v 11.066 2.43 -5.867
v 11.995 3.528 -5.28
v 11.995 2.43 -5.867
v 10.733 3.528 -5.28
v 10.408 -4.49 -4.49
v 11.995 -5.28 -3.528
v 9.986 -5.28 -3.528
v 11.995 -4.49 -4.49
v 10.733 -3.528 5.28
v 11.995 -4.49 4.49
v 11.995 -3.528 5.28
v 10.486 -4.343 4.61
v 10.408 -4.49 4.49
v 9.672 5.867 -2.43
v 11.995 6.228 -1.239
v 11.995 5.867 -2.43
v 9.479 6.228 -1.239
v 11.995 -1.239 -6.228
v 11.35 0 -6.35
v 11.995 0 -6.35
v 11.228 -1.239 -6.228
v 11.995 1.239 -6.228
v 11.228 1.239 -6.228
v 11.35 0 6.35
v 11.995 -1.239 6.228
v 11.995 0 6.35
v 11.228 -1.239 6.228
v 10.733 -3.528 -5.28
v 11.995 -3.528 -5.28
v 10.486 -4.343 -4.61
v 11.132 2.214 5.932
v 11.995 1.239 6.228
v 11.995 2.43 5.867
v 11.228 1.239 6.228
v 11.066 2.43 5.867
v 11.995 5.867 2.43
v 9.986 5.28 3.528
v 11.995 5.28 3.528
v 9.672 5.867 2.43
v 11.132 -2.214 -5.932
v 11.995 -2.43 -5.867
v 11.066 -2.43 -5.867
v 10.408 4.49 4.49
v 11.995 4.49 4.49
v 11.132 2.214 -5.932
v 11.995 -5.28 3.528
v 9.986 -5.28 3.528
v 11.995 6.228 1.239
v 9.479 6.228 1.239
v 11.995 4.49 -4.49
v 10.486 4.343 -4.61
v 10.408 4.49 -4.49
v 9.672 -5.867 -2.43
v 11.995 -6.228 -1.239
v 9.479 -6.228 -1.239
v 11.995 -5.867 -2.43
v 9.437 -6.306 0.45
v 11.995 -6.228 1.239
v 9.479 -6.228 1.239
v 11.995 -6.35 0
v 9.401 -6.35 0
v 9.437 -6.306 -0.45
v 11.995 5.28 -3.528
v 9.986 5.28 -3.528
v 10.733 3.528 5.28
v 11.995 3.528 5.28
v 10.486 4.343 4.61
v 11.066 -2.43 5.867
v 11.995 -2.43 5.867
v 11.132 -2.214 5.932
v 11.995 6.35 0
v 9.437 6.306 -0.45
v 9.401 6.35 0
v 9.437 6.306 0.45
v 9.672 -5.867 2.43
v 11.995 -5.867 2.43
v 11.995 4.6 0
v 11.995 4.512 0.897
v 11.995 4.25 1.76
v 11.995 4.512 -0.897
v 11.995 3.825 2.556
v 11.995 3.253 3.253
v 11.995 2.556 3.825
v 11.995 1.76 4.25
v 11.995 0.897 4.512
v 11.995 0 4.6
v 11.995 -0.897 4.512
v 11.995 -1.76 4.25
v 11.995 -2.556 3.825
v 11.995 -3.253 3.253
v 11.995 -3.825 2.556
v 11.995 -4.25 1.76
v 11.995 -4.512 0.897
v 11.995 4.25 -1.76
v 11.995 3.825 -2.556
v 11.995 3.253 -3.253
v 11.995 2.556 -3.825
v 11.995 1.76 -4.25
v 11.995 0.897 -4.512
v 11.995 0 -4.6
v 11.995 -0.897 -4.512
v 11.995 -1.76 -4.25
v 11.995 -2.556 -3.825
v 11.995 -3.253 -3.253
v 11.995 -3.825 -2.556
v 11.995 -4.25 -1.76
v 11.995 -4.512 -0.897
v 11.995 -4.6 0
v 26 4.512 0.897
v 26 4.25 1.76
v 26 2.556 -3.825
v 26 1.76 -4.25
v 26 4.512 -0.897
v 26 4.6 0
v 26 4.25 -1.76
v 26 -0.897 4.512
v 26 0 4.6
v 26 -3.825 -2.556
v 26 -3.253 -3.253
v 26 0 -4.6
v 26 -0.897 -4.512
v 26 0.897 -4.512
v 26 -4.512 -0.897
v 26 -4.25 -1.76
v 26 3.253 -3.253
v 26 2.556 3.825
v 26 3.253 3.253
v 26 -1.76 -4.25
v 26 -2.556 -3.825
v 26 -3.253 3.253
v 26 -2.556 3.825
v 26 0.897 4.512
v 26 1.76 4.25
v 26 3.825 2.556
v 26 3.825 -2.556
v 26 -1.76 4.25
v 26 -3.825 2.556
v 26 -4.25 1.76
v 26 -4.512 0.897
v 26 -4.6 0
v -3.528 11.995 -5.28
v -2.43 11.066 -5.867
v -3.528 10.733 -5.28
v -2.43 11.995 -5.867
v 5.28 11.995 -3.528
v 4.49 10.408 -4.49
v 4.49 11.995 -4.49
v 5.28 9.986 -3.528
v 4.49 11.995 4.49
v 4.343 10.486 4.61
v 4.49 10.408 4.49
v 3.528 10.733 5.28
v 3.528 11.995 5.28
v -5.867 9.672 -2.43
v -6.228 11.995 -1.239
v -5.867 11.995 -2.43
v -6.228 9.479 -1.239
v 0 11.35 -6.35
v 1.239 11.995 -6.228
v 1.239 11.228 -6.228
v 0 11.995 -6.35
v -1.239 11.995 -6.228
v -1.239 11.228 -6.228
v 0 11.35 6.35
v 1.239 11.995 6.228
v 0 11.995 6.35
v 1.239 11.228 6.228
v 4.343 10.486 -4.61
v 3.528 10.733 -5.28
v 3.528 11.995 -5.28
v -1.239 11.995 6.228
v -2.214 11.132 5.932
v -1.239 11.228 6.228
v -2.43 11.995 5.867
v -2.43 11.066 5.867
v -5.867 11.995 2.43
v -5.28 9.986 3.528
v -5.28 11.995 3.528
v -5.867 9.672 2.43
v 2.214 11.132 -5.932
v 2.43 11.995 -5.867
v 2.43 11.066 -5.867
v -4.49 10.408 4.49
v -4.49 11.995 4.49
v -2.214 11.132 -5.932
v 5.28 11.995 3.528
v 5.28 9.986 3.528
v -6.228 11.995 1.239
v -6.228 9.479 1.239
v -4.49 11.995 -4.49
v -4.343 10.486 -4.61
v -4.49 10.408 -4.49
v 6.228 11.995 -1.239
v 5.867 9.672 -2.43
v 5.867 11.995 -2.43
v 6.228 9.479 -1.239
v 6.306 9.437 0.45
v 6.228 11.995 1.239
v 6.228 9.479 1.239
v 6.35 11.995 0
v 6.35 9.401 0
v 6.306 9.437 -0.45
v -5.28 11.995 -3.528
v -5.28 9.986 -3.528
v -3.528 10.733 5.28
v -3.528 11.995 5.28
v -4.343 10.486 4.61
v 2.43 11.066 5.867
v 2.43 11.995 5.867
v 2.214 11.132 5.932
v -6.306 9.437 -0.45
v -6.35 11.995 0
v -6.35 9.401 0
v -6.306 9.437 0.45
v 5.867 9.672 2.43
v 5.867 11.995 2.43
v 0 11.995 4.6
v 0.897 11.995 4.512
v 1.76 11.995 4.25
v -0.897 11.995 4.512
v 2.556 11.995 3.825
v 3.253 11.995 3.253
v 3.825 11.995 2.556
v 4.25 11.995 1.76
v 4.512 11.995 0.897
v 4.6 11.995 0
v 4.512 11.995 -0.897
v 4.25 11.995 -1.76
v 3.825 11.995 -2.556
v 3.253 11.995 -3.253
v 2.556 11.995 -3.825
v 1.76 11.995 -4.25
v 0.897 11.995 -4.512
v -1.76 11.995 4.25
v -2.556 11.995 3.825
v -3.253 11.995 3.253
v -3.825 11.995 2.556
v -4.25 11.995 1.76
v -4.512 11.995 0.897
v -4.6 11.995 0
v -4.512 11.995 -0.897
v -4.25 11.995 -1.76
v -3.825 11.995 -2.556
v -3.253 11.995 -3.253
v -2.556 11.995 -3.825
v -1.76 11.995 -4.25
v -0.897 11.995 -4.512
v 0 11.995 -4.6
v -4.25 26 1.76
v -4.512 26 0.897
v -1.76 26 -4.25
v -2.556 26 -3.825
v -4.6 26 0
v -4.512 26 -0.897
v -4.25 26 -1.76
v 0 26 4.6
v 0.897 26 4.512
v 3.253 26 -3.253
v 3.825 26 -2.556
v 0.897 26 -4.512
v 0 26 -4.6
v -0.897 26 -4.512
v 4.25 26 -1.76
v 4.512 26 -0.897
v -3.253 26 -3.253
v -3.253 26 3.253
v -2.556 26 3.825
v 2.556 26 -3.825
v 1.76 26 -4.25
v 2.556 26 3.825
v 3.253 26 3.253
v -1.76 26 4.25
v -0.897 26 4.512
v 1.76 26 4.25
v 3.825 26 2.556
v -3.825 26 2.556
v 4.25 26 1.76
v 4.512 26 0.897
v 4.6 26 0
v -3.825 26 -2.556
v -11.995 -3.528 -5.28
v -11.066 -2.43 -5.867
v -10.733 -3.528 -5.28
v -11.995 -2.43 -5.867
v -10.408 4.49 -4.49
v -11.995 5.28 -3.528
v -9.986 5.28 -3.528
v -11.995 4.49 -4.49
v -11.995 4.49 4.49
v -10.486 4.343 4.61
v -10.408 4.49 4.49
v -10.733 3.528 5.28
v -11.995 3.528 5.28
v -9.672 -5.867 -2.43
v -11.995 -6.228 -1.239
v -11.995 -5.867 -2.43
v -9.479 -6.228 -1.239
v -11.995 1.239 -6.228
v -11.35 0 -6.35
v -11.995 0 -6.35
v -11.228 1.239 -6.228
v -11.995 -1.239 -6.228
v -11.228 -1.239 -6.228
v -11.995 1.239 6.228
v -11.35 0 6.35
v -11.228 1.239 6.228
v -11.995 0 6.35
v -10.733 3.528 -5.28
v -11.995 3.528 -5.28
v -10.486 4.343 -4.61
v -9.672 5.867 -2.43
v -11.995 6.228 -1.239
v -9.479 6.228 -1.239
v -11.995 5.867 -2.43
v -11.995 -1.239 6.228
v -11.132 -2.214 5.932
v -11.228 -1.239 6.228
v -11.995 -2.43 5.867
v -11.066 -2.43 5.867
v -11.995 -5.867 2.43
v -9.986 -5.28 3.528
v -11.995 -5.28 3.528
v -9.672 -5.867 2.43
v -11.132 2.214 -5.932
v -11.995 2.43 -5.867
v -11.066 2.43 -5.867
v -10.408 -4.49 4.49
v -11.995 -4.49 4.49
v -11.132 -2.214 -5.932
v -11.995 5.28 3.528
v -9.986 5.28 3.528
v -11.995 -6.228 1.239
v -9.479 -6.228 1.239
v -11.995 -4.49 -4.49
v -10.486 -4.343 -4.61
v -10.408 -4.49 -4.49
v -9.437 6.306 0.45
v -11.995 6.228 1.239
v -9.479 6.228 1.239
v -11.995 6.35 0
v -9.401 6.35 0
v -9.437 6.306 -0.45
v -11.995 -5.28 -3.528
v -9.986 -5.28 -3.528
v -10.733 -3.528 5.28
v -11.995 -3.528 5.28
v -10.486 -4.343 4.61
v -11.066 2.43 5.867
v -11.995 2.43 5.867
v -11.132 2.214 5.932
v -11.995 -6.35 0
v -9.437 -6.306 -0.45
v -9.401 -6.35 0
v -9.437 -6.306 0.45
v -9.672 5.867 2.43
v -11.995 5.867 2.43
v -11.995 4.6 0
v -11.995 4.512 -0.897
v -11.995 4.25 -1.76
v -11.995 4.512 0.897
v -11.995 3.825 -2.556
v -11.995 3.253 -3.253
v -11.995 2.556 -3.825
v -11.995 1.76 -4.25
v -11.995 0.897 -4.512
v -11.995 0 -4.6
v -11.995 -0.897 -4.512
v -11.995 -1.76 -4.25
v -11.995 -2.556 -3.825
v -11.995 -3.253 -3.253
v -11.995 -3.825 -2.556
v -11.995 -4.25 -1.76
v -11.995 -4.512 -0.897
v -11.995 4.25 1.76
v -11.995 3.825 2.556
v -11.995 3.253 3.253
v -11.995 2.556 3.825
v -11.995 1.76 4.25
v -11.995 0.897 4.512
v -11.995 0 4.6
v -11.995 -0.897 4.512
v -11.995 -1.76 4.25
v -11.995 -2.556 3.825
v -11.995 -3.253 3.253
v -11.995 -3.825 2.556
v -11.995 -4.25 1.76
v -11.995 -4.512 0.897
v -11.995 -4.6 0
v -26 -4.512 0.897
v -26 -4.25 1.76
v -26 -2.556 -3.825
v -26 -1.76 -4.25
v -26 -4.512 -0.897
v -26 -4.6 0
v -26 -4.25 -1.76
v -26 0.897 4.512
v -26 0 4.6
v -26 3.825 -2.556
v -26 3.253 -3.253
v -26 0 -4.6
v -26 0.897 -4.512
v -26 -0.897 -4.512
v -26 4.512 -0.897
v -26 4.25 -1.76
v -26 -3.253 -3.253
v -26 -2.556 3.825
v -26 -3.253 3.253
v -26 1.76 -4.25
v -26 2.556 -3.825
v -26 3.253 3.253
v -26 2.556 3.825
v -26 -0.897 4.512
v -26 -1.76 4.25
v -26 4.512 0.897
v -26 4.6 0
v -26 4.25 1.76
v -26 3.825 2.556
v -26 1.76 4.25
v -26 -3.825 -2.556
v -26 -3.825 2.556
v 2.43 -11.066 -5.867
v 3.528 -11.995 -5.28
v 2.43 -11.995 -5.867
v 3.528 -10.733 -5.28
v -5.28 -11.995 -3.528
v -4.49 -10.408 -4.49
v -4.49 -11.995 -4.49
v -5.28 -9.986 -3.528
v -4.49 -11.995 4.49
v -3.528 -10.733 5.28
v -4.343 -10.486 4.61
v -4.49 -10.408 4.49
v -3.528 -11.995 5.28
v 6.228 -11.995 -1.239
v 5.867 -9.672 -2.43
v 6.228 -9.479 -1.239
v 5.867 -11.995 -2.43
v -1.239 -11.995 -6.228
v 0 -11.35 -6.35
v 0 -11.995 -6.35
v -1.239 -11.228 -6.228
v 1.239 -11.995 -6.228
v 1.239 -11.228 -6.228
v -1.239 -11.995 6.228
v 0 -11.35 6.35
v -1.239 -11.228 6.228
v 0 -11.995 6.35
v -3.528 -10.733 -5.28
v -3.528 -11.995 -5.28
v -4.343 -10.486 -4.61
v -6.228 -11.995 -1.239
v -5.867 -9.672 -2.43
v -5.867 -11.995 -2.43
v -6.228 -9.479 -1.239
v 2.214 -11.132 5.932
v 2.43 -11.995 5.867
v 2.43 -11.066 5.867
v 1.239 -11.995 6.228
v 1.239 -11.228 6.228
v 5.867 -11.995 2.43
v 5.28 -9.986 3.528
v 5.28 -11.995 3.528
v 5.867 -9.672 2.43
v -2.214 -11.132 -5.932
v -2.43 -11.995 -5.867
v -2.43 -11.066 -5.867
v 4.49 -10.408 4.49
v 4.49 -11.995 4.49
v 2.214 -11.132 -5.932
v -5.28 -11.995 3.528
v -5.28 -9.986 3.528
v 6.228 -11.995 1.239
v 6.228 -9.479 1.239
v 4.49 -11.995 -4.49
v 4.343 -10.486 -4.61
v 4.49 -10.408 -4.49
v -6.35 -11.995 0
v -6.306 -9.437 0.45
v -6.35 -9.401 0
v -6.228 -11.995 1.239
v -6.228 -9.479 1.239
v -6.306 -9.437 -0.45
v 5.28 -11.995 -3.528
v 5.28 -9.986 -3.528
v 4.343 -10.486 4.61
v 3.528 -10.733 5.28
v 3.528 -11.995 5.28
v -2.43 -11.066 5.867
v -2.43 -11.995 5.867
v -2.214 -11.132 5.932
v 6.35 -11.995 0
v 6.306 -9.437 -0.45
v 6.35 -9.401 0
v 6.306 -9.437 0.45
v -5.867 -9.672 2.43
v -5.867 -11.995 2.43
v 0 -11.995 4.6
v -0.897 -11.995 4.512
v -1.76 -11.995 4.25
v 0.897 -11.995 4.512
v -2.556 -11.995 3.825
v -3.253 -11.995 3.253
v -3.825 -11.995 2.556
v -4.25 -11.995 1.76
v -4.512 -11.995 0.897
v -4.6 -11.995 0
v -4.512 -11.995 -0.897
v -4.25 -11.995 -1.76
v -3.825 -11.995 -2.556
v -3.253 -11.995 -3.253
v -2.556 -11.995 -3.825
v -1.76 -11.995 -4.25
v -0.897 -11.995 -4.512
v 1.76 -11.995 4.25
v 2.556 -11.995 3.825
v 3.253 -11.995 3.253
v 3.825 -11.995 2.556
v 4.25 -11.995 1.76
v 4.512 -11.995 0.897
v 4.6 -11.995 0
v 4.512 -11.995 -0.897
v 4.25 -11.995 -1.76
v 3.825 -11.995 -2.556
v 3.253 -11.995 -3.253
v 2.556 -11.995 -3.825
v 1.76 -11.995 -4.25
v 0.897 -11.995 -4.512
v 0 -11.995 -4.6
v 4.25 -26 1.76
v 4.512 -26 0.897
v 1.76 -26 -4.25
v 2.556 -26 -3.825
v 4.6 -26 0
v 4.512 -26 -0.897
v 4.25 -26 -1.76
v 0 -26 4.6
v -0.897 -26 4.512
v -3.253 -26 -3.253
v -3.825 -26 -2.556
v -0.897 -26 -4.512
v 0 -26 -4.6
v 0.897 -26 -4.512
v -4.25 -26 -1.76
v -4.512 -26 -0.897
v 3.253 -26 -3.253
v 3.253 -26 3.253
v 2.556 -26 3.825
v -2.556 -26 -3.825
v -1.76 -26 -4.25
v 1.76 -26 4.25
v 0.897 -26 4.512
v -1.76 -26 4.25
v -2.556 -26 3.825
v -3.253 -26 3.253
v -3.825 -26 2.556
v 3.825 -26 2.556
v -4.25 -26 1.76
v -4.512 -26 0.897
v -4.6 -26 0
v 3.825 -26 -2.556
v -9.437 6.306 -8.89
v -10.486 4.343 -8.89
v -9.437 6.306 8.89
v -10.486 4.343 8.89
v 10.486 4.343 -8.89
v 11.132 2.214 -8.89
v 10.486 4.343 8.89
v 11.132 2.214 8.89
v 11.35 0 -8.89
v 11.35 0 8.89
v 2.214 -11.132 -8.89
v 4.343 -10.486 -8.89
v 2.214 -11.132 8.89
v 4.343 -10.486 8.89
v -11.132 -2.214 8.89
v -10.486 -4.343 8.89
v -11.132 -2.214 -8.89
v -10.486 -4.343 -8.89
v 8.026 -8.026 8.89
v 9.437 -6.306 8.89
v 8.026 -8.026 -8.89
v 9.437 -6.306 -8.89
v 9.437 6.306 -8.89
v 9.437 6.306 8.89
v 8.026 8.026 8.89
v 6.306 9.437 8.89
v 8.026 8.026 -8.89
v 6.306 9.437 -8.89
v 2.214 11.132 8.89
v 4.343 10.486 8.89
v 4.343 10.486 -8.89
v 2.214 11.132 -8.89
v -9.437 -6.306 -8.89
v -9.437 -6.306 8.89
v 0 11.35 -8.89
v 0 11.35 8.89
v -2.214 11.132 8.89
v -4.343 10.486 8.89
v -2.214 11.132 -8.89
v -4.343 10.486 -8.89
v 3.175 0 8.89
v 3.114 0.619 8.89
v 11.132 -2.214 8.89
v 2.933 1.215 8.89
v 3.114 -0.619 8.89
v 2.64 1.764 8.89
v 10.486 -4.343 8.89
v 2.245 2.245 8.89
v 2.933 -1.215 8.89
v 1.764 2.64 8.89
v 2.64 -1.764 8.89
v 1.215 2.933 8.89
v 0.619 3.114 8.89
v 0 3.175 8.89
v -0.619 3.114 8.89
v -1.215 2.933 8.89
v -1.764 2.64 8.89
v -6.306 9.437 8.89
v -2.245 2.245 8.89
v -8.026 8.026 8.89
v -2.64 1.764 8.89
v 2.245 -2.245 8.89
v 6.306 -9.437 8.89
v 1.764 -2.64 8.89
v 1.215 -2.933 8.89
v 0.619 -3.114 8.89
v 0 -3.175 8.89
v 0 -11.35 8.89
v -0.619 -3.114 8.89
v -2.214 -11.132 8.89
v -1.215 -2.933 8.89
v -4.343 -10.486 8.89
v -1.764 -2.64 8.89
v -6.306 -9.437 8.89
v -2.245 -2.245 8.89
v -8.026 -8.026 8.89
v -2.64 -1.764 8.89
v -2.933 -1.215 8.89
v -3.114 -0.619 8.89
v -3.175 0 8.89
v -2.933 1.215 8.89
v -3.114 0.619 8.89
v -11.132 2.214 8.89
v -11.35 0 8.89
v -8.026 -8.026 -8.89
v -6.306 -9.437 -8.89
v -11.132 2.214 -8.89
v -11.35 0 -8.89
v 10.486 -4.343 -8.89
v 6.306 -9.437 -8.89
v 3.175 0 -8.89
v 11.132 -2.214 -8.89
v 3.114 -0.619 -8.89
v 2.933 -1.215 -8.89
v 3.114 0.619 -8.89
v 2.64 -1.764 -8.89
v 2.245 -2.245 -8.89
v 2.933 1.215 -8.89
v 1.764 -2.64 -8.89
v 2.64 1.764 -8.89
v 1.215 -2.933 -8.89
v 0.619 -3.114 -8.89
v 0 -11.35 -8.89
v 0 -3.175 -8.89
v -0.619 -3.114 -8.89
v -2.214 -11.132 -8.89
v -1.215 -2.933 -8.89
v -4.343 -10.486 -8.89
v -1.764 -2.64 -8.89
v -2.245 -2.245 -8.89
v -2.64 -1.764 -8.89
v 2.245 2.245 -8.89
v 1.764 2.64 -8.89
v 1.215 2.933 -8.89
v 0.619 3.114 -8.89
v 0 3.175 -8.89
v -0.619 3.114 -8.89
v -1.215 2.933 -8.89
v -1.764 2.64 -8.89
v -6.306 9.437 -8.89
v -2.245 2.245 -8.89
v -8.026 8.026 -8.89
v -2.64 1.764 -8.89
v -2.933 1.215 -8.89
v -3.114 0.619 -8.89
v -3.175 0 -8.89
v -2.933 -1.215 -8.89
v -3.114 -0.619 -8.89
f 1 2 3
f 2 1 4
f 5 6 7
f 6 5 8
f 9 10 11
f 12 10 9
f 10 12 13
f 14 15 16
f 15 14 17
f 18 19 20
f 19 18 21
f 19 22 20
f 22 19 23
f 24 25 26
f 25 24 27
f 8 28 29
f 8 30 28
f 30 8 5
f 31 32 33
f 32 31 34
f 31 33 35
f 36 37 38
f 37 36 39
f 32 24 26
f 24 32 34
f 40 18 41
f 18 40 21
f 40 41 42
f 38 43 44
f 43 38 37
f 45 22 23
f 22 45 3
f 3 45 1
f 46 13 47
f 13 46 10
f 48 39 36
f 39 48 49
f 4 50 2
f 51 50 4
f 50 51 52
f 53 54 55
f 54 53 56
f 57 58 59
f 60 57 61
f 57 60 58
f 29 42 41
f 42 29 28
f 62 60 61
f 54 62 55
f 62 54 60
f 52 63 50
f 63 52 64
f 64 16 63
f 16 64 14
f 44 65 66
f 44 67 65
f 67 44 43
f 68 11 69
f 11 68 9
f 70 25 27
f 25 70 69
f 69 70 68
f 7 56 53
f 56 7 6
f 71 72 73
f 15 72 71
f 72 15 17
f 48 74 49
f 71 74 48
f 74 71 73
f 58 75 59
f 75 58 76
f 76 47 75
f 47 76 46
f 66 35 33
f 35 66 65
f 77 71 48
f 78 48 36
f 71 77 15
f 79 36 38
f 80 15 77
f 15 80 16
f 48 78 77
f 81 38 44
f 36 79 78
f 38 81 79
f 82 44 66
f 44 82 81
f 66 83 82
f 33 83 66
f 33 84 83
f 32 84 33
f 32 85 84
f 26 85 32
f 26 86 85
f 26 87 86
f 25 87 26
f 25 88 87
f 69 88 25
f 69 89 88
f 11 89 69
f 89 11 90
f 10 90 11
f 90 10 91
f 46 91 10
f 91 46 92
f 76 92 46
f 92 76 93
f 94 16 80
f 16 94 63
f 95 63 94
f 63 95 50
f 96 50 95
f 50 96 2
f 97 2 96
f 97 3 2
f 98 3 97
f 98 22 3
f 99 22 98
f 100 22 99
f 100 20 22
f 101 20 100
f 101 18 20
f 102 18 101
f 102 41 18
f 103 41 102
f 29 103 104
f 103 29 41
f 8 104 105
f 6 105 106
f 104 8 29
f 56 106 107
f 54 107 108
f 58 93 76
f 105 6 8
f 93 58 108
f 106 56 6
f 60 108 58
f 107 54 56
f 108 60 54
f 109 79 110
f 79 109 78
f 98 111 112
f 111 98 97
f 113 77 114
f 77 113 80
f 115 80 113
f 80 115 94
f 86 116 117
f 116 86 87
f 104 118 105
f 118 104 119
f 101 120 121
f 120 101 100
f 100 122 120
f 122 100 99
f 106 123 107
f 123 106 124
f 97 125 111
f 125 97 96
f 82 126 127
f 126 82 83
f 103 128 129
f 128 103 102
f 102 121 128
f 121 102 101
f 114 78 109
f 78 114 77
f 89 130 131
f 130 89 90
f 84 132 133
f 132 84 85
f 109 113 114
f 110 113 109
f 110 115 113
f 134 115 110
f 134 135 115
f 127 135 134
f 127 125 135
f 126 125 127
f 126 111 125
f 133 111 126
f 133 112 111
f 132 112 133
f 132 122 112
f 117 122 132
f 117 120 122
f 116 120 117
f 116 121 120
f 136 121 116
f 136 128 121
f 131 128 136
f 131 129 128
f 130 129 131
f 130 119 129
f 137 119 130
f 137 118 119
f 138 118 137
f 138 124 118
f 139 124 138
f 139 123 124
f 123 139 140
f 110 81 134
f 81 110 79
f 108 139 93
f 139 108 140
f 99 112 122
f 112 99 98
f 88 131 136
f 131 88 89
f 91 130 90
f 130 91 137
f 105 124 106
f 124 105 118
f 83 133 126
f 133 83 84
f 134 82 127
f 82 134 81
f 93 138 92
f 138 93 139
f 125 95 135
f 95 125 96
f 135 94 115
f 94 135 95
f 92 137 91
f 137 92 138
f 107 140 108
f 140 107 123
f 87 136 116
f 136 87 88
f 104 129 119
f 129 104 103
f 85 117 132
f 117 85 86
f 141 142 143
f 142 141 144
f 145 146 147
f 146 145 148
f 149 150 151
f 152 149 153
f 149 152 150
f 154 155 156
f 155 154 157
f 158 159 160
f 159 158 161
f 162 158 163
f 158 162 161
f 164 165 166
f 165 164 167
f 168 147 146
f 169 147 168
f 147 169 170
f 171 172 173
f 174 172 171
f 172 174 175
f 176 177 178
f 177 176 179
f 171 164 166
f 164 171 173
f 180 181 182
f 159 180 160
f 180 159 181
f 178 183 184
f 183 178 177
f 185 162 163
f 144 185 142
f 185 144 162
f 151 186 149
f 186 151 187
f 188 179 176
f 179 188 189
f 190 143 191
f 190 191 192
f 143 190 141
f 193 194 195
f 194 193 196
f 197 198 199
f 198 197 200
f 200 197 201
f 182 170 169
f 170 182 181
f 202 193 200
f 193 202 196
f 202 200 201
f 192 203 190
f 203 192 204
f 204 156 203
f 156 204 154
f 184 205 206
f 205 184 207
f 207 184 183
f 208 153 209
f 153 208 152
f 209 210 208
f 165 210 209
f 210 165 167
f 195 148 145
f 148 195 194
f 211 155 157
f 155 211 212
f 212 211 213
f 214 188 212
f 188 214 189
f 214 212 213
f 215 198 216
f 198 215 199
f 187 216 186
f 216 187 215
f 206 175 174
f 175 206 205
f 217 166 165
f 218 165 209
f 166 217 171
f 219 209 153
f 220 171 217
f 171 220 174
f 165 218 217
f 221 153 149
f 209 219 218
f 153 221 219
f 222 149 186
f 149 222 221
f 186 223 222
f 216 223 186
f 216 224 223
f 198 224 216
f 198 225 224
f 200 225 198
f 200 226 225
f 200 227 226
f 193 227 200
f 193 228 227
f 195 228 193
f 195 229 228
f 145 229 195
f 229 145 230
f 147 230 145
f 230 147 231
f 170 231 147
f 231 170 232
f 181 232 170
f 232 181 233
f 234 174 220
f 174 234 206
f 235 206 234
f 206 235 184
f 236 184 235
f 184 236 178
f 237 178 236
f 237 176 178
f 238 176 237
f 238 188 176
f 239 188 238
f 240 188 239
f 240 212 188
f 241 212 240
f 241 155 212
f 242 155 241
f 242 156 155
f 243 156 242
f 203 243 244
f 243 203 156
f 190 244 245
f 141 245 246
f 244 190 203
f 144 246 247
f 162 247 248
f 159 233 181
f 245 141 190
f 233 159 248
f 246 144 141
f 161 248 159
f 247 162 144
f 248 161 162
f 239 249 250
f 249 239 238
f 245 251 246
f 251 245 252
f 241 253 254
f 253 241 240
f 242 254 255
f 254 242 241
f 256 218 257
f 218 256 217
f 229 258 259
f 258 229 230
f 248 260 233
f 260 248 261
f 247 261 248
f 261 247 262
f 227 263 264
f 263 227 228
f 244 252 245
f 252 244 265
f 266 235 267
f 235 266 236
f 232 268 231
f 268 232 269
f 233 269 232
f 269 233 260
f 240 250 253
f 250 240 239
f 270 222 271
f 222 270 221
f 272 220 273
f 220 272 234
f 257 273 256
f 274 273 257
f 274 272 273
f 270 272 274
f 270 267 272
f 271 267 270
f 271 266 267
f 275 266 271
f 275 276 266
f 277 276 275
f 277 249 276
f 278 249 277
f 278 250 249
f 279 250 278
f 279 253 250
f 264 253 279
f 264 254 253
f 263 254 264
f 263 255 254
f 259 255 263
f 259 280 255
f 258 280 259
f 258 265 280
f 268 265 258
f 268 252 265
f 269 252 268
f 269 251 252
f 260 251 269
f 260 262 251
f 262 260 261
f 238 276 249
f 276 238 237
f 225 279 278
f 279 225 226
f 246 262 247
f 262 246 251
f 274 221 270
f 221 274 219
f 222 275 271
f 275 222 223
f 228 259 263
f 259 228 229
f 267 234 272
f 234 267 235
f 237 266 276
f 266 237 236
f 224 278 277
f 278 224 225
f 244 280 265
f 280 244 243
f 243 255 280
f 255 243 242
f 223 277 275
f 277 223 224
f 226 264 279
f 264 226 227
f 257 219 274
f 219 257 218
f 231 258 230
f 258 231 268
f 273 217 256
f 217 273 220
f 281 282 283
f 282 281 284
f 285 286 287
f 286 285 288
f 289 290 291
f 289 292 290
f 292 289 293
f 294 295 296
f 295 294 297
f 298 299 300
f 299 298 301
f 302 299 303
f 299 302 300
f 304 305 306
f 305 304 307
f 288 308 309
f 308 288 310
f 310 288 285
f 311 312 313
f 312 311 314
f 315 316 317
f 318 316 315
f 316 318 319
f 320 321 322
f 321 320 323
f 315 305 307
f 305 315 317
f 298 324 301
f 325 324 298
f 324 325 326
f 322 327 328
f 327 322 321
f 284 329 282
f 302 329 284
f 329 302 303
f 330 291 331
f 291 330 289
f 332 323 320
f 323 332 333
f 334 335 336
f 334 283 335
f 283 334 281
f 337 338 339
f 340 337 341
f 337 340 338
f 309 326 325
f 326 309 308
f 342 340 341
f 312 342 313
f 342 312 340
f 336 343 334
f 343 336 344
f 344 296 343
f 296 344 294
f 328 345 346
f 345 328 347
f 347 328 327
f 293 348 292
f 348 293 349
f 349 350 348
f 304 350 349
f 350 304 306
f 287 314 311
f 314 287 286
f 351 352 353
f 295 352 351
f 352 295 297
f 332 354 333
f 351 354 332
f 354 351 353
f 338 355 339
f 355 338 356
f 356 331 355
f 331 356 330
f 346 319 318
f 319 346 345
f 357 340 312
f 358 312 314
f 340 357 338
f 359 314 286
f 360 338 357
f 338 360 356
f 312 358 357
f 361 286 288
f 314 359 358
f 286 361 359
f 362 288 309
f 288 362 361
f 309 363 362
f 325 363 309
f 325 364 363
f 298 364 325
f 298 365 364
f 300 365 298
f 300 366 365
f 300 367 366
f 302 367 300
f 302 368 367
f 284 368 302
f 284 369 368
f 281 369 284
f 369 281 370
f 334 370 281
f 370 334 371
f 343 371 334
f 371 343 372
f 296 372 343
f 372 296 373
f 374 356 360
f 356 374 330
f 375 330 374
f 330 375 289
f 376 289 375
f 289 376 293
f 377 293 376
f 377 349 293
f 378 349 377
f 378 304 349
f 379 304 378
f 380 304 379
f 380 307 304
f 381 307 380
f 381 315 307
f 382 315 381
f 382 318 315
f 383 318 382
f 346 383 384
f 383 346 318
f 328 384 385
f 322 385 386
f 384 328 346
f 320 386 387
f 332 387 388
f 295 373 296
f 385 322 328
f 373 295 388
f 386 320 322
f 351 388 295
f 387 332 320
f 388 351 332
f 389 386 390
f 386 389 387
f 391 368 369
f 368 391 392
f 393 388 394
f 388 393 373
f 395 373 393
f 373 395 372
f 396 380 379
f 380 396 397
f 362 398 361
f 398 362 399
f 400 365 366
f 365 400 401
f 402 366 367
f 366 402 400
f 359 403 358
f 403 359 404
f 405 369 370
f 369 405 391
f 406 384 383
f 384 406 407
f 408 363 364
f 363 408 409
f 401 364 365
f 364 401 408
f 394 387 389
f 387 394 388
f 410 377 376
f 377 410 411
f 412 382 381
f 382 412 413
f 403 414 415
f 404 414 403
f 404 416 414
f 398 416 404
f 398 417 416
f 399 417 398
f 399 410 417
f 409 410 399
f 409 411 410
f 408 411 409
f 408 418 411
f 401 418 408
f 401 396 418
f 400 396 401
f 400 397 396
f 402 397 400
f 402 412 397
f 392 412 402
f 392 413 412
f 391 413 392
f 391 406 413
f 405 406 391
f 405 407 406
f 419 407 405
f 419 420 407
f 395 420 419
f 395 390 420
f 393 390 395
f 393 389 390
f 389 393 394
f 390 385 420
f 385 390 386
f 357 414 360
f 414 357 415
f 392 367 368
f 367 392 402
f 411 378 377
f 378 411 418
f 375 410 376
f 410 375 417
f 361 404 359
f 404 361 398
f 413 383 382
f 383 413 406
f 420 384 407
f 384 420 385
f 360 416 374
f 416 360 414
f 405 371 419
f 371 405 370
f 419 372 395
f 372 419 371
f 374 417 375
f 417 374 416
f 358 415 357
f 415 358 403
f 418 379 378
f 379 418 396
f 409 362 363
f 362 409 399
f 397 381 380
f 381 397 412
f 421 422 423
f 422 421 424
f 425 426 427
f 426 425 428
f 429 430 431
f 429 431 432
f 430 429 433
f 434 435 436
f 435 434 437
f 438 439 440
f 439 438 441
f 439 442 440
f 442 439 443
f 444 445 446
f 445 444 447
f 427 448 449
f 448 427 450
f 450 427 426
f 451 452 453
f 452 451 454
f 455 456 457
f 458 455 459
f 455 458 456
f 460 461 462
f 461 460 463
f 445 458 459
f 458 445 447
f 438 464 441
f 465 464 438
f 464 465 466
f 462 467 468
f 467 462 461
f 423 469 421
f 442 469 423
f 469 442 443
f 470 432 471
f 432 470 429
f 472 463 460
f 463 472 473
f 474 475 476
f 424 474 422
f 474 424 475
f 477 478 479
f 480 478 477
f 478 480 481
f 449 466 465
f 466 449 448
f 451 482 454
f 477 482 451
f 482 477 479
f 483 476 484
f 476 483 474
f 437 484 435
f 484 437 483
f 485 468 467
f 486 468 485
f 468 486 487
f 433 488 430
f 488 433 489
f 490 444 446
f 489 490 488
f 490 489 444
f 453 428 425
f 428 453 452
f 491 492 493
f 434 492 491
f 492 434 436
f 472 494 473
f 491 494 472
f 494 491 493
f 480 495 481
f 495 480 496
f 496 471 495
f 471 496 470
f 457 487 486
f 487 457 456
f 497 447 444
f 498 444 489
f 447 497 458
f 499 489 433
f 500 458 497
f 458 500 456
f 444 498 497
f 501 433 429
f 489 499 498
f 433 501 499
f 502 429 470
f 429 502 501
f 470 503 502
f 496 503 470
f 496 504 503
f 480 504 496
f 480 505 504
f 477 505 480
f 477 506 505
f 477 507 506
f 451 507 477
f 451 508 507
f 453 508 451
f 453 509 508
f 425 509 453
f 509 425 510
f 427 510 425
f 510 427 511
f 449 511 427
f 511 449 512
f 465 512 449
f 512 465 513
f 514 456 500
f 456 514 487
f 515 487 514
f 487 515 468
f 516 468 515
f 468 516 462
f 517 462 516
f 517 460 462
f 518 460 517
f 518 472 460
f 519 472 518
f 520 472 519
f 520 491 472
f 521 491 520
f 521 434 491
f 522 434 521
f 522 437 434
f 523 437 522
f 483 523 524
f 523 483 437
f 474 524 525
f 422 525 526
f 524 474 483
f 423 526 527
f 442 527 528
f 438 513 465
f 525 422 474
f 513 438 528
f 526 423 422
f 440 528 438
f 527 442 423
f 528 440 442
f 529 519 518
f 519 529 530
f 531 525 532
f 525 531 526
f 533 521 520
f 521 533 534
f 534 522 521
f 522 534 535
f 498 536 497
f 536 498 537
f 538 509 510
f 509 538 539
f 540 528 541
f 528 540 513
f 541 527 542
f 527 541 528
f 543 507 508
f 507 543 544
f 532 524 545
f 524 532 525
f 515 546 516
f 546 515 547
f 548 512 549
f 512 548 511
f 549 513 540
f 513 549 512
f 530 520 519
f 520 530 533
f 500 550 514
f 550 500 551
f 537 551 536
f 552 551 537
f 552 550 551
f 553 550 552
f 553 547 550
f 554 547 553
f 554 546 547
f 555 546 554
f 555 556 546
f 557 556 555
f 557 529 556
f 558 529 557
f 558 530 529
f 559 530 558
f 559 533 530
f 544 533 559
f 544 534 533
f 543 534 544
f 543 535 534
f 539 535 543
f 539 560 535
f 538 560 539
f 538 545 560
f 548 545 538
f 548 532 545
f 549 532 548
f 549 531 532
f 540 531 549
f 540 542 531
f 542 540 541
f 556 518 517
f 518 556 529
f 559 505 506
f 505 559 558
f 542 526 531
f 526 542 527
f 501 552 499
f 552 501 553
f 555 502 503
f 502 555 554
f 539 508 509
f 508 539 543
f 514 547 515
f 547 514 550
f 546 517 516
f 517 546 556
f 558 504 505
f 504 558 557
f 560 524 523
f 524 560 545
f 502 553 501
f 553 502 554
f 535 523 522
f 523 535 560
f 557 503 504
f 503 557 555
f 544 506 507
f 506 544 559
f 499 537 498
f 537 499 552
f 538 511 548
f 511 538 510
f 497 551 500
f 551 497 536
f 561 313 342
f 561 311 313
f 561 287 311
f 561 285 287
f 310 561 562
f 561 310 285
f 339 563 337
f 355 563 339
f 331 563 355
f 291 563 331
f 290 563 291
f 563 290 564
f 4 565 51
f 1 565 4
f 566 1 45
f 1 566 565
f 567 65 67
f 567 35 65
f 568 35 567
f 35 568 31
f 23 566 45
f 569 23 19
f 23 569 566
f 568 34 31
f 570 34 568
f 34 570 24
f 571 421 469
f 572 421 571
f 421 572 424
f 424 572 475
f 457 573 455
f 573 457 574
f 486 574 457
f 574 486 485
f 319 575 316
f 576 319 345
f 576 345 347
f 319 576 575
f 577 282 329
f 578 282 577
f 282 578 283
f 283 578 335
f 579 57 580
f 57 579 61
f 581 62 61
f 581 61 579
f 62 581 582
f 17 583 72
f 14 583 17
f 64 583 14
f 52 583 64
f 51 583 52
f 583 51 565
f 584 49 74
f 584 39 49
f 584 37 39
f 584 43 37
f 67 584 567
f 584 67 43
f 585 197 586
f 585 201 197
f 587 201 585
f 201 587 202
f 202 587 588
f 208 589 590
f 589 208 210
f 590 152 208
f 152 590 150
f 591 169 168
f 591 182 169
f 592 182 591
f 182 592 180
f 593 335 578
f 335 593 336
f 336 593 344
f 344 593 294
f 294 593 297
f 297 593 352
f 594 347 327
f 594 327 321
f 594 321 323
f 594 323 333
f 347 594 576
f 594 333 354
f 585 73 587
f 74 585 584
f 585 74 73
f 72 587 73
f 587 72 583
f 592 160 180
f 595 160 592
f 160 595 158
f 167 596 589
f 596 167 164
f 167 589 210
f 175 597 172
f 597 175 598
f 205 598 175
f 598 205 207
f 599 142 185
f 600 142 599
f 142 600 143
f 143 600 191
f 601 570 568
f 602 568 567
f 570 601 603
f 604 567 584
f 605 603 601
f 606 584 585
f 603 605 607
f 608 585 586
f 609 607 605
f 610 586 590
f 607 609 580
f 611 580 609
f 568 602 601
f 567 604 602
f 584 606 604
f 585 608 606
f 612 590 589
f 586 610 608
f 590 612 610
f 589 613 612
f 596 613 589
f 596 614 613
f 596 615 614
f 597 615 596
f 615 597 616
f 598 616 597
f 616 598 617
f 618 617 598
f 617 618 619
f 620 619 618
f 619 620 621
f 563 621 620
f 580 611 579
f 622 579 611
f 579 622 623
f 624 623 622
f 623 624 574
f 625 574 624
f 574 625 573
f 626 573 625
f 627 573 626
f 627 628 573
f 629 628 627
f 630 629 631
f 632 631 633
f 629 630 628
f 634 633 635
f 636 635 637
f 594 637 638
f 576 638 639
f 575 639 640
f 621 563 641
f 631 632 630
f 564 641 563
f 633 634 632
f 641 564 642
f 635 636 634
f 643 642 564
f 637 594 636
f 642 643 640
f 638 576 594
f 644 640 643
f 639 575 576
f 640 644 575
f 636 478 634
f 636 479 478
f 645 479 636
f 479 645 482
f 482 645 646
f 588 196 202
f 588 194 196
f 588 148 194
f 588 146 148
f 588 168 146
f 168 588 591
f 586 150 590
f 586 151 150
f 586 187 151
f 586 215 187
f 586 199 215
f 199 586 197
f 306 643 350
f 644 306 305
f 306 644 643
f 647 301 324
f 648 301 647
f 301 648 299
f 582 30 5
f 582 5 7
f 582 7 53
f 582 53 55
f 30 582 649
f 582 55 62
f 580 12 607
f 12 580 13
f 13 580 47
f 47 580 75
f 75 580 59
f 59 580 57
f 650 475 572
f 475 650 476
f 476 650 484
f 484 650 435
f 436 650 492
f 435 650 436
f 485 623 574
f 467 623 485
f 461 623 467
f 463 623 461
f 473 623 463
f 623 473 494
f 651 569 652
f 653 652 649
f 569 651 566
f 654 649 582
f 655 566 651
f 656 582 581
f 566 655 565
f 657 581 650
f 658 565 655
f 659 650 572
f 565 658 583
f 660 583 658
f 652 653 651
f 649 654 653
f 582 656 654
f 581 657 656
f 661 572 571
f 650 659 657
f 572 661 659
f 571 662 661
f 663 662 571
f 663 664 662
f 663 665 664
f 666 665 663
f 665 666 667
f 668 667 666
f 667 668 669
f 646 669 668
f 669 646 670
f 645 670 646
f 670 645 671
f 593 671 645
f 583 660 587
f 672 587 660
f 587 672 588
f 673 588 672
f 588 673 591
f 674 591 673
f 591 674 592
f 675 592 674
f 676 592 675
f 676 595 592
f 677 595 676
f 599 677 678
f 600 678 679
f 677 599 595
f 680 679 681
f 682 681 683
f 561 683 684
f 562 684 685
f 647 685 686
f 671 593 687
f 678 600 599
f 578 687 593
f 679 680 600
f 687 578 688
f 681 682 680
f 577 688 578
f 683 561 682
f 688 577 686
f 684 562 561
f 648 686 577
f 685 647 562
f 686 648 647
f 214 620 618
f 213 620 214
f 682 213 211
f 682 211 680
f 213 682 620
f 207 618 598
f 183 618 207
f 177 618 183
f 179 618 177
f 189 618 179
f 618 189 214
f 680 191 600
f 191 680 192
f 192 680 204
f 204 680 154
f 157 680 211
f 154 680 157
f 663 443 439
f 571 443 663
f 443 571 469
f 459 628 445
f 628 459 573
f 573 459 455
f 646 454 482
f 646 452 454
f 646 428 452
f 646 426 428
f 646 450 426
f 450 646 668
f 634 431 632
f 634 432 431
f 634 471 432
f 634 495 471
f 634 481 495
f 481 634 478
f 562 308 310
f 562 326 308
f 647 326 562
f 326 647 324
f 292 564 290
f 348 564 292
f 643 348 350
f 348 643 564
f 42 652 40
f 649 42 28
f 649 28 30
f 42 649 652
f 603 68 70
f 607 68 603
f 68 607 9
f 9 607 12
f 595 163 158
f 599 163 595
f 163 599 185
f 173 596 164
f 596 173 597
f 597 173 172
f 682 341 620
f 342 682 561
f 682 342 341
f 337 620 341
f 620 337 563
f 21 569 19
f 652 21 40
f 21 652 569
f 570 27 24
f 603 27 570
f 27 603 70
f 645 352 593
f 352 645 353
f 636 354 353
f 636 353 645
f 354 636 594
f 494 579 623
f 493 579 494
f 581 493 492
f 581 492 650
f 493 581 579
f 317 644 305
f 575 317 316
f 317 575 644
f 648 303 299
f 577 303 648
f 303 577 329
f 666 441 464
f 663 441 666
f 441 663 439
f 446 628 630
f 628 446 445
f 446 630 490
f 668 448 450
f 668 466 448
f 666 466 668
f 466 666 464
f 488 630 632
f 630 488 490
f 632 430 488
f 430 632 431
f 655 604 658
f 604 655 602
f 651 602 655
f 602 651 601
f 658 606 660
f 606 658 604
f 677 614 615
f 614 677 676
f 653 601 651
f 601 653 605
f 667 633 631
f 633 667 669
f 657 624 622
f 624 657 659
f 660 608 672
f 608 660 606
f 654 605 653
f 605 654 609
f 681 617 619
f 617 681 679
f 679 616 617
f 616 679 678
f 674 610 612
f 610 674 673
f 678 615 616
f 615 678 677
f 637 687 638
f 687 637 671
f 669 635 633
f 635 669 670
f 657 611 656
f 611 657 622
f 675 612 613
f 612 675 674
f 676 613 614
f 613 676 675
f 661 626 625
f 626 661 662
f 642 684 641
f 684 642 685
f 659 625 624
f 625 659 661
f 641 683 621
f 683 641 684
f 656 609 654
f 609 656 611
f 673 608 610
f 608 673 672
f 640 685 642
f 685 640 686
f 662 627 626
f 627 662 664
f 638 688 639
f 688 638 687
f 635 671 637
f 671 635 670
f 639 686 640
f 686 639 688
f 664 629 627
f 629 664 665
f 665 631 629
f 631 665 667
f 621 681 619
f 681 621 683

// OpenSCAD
$fn = 32;

// ----------------------------------------------------------------------
// Cardan cross: 52 mm span, 12.7 mm trunnions
// ----------------------------------------------------------------------

// --- parameters (mm) ---
journal_d = 12.7;         // trunnion diameter
arm_len = 26;             // trunnion length from the centre
step_r = 4.32;            // step position from the centre
step_d = 9.2;             // journal diameter after the step
hub_d = 22.7;             // hub diameter
hub_h = 17.78;            // hub height
bore_d = 6.35;            // hub bore

difference() {
  union() {
    /* hub along the joint axis */
    cylinder(h = hub_h, d = hub_d, center = true);
    for (a = [0 : 90 : 270]) rotate([0, 0, a]) {
      /* trunnion, sunk into the hub */
      translate([hub_d / 4, 0, 0]) rotate([0, 90, 0]) cylinder(h = step_r + 2, d = journal_d);
      /* stepped journal out to the tip */
      translate([step_r - 0.5, 0, 0]) rotate([0, 90, 0]) cylinder(h = arm_len + 0.5 - step_r, d = step_d);
    }
  }
  /* lubrication bore through the hub, 2.5 mm clear on both sides */
  translate([0, 0, -hub_h / 2 - 2.5]) cylinder(h = hub_h + 5, d = bore_d);
}
